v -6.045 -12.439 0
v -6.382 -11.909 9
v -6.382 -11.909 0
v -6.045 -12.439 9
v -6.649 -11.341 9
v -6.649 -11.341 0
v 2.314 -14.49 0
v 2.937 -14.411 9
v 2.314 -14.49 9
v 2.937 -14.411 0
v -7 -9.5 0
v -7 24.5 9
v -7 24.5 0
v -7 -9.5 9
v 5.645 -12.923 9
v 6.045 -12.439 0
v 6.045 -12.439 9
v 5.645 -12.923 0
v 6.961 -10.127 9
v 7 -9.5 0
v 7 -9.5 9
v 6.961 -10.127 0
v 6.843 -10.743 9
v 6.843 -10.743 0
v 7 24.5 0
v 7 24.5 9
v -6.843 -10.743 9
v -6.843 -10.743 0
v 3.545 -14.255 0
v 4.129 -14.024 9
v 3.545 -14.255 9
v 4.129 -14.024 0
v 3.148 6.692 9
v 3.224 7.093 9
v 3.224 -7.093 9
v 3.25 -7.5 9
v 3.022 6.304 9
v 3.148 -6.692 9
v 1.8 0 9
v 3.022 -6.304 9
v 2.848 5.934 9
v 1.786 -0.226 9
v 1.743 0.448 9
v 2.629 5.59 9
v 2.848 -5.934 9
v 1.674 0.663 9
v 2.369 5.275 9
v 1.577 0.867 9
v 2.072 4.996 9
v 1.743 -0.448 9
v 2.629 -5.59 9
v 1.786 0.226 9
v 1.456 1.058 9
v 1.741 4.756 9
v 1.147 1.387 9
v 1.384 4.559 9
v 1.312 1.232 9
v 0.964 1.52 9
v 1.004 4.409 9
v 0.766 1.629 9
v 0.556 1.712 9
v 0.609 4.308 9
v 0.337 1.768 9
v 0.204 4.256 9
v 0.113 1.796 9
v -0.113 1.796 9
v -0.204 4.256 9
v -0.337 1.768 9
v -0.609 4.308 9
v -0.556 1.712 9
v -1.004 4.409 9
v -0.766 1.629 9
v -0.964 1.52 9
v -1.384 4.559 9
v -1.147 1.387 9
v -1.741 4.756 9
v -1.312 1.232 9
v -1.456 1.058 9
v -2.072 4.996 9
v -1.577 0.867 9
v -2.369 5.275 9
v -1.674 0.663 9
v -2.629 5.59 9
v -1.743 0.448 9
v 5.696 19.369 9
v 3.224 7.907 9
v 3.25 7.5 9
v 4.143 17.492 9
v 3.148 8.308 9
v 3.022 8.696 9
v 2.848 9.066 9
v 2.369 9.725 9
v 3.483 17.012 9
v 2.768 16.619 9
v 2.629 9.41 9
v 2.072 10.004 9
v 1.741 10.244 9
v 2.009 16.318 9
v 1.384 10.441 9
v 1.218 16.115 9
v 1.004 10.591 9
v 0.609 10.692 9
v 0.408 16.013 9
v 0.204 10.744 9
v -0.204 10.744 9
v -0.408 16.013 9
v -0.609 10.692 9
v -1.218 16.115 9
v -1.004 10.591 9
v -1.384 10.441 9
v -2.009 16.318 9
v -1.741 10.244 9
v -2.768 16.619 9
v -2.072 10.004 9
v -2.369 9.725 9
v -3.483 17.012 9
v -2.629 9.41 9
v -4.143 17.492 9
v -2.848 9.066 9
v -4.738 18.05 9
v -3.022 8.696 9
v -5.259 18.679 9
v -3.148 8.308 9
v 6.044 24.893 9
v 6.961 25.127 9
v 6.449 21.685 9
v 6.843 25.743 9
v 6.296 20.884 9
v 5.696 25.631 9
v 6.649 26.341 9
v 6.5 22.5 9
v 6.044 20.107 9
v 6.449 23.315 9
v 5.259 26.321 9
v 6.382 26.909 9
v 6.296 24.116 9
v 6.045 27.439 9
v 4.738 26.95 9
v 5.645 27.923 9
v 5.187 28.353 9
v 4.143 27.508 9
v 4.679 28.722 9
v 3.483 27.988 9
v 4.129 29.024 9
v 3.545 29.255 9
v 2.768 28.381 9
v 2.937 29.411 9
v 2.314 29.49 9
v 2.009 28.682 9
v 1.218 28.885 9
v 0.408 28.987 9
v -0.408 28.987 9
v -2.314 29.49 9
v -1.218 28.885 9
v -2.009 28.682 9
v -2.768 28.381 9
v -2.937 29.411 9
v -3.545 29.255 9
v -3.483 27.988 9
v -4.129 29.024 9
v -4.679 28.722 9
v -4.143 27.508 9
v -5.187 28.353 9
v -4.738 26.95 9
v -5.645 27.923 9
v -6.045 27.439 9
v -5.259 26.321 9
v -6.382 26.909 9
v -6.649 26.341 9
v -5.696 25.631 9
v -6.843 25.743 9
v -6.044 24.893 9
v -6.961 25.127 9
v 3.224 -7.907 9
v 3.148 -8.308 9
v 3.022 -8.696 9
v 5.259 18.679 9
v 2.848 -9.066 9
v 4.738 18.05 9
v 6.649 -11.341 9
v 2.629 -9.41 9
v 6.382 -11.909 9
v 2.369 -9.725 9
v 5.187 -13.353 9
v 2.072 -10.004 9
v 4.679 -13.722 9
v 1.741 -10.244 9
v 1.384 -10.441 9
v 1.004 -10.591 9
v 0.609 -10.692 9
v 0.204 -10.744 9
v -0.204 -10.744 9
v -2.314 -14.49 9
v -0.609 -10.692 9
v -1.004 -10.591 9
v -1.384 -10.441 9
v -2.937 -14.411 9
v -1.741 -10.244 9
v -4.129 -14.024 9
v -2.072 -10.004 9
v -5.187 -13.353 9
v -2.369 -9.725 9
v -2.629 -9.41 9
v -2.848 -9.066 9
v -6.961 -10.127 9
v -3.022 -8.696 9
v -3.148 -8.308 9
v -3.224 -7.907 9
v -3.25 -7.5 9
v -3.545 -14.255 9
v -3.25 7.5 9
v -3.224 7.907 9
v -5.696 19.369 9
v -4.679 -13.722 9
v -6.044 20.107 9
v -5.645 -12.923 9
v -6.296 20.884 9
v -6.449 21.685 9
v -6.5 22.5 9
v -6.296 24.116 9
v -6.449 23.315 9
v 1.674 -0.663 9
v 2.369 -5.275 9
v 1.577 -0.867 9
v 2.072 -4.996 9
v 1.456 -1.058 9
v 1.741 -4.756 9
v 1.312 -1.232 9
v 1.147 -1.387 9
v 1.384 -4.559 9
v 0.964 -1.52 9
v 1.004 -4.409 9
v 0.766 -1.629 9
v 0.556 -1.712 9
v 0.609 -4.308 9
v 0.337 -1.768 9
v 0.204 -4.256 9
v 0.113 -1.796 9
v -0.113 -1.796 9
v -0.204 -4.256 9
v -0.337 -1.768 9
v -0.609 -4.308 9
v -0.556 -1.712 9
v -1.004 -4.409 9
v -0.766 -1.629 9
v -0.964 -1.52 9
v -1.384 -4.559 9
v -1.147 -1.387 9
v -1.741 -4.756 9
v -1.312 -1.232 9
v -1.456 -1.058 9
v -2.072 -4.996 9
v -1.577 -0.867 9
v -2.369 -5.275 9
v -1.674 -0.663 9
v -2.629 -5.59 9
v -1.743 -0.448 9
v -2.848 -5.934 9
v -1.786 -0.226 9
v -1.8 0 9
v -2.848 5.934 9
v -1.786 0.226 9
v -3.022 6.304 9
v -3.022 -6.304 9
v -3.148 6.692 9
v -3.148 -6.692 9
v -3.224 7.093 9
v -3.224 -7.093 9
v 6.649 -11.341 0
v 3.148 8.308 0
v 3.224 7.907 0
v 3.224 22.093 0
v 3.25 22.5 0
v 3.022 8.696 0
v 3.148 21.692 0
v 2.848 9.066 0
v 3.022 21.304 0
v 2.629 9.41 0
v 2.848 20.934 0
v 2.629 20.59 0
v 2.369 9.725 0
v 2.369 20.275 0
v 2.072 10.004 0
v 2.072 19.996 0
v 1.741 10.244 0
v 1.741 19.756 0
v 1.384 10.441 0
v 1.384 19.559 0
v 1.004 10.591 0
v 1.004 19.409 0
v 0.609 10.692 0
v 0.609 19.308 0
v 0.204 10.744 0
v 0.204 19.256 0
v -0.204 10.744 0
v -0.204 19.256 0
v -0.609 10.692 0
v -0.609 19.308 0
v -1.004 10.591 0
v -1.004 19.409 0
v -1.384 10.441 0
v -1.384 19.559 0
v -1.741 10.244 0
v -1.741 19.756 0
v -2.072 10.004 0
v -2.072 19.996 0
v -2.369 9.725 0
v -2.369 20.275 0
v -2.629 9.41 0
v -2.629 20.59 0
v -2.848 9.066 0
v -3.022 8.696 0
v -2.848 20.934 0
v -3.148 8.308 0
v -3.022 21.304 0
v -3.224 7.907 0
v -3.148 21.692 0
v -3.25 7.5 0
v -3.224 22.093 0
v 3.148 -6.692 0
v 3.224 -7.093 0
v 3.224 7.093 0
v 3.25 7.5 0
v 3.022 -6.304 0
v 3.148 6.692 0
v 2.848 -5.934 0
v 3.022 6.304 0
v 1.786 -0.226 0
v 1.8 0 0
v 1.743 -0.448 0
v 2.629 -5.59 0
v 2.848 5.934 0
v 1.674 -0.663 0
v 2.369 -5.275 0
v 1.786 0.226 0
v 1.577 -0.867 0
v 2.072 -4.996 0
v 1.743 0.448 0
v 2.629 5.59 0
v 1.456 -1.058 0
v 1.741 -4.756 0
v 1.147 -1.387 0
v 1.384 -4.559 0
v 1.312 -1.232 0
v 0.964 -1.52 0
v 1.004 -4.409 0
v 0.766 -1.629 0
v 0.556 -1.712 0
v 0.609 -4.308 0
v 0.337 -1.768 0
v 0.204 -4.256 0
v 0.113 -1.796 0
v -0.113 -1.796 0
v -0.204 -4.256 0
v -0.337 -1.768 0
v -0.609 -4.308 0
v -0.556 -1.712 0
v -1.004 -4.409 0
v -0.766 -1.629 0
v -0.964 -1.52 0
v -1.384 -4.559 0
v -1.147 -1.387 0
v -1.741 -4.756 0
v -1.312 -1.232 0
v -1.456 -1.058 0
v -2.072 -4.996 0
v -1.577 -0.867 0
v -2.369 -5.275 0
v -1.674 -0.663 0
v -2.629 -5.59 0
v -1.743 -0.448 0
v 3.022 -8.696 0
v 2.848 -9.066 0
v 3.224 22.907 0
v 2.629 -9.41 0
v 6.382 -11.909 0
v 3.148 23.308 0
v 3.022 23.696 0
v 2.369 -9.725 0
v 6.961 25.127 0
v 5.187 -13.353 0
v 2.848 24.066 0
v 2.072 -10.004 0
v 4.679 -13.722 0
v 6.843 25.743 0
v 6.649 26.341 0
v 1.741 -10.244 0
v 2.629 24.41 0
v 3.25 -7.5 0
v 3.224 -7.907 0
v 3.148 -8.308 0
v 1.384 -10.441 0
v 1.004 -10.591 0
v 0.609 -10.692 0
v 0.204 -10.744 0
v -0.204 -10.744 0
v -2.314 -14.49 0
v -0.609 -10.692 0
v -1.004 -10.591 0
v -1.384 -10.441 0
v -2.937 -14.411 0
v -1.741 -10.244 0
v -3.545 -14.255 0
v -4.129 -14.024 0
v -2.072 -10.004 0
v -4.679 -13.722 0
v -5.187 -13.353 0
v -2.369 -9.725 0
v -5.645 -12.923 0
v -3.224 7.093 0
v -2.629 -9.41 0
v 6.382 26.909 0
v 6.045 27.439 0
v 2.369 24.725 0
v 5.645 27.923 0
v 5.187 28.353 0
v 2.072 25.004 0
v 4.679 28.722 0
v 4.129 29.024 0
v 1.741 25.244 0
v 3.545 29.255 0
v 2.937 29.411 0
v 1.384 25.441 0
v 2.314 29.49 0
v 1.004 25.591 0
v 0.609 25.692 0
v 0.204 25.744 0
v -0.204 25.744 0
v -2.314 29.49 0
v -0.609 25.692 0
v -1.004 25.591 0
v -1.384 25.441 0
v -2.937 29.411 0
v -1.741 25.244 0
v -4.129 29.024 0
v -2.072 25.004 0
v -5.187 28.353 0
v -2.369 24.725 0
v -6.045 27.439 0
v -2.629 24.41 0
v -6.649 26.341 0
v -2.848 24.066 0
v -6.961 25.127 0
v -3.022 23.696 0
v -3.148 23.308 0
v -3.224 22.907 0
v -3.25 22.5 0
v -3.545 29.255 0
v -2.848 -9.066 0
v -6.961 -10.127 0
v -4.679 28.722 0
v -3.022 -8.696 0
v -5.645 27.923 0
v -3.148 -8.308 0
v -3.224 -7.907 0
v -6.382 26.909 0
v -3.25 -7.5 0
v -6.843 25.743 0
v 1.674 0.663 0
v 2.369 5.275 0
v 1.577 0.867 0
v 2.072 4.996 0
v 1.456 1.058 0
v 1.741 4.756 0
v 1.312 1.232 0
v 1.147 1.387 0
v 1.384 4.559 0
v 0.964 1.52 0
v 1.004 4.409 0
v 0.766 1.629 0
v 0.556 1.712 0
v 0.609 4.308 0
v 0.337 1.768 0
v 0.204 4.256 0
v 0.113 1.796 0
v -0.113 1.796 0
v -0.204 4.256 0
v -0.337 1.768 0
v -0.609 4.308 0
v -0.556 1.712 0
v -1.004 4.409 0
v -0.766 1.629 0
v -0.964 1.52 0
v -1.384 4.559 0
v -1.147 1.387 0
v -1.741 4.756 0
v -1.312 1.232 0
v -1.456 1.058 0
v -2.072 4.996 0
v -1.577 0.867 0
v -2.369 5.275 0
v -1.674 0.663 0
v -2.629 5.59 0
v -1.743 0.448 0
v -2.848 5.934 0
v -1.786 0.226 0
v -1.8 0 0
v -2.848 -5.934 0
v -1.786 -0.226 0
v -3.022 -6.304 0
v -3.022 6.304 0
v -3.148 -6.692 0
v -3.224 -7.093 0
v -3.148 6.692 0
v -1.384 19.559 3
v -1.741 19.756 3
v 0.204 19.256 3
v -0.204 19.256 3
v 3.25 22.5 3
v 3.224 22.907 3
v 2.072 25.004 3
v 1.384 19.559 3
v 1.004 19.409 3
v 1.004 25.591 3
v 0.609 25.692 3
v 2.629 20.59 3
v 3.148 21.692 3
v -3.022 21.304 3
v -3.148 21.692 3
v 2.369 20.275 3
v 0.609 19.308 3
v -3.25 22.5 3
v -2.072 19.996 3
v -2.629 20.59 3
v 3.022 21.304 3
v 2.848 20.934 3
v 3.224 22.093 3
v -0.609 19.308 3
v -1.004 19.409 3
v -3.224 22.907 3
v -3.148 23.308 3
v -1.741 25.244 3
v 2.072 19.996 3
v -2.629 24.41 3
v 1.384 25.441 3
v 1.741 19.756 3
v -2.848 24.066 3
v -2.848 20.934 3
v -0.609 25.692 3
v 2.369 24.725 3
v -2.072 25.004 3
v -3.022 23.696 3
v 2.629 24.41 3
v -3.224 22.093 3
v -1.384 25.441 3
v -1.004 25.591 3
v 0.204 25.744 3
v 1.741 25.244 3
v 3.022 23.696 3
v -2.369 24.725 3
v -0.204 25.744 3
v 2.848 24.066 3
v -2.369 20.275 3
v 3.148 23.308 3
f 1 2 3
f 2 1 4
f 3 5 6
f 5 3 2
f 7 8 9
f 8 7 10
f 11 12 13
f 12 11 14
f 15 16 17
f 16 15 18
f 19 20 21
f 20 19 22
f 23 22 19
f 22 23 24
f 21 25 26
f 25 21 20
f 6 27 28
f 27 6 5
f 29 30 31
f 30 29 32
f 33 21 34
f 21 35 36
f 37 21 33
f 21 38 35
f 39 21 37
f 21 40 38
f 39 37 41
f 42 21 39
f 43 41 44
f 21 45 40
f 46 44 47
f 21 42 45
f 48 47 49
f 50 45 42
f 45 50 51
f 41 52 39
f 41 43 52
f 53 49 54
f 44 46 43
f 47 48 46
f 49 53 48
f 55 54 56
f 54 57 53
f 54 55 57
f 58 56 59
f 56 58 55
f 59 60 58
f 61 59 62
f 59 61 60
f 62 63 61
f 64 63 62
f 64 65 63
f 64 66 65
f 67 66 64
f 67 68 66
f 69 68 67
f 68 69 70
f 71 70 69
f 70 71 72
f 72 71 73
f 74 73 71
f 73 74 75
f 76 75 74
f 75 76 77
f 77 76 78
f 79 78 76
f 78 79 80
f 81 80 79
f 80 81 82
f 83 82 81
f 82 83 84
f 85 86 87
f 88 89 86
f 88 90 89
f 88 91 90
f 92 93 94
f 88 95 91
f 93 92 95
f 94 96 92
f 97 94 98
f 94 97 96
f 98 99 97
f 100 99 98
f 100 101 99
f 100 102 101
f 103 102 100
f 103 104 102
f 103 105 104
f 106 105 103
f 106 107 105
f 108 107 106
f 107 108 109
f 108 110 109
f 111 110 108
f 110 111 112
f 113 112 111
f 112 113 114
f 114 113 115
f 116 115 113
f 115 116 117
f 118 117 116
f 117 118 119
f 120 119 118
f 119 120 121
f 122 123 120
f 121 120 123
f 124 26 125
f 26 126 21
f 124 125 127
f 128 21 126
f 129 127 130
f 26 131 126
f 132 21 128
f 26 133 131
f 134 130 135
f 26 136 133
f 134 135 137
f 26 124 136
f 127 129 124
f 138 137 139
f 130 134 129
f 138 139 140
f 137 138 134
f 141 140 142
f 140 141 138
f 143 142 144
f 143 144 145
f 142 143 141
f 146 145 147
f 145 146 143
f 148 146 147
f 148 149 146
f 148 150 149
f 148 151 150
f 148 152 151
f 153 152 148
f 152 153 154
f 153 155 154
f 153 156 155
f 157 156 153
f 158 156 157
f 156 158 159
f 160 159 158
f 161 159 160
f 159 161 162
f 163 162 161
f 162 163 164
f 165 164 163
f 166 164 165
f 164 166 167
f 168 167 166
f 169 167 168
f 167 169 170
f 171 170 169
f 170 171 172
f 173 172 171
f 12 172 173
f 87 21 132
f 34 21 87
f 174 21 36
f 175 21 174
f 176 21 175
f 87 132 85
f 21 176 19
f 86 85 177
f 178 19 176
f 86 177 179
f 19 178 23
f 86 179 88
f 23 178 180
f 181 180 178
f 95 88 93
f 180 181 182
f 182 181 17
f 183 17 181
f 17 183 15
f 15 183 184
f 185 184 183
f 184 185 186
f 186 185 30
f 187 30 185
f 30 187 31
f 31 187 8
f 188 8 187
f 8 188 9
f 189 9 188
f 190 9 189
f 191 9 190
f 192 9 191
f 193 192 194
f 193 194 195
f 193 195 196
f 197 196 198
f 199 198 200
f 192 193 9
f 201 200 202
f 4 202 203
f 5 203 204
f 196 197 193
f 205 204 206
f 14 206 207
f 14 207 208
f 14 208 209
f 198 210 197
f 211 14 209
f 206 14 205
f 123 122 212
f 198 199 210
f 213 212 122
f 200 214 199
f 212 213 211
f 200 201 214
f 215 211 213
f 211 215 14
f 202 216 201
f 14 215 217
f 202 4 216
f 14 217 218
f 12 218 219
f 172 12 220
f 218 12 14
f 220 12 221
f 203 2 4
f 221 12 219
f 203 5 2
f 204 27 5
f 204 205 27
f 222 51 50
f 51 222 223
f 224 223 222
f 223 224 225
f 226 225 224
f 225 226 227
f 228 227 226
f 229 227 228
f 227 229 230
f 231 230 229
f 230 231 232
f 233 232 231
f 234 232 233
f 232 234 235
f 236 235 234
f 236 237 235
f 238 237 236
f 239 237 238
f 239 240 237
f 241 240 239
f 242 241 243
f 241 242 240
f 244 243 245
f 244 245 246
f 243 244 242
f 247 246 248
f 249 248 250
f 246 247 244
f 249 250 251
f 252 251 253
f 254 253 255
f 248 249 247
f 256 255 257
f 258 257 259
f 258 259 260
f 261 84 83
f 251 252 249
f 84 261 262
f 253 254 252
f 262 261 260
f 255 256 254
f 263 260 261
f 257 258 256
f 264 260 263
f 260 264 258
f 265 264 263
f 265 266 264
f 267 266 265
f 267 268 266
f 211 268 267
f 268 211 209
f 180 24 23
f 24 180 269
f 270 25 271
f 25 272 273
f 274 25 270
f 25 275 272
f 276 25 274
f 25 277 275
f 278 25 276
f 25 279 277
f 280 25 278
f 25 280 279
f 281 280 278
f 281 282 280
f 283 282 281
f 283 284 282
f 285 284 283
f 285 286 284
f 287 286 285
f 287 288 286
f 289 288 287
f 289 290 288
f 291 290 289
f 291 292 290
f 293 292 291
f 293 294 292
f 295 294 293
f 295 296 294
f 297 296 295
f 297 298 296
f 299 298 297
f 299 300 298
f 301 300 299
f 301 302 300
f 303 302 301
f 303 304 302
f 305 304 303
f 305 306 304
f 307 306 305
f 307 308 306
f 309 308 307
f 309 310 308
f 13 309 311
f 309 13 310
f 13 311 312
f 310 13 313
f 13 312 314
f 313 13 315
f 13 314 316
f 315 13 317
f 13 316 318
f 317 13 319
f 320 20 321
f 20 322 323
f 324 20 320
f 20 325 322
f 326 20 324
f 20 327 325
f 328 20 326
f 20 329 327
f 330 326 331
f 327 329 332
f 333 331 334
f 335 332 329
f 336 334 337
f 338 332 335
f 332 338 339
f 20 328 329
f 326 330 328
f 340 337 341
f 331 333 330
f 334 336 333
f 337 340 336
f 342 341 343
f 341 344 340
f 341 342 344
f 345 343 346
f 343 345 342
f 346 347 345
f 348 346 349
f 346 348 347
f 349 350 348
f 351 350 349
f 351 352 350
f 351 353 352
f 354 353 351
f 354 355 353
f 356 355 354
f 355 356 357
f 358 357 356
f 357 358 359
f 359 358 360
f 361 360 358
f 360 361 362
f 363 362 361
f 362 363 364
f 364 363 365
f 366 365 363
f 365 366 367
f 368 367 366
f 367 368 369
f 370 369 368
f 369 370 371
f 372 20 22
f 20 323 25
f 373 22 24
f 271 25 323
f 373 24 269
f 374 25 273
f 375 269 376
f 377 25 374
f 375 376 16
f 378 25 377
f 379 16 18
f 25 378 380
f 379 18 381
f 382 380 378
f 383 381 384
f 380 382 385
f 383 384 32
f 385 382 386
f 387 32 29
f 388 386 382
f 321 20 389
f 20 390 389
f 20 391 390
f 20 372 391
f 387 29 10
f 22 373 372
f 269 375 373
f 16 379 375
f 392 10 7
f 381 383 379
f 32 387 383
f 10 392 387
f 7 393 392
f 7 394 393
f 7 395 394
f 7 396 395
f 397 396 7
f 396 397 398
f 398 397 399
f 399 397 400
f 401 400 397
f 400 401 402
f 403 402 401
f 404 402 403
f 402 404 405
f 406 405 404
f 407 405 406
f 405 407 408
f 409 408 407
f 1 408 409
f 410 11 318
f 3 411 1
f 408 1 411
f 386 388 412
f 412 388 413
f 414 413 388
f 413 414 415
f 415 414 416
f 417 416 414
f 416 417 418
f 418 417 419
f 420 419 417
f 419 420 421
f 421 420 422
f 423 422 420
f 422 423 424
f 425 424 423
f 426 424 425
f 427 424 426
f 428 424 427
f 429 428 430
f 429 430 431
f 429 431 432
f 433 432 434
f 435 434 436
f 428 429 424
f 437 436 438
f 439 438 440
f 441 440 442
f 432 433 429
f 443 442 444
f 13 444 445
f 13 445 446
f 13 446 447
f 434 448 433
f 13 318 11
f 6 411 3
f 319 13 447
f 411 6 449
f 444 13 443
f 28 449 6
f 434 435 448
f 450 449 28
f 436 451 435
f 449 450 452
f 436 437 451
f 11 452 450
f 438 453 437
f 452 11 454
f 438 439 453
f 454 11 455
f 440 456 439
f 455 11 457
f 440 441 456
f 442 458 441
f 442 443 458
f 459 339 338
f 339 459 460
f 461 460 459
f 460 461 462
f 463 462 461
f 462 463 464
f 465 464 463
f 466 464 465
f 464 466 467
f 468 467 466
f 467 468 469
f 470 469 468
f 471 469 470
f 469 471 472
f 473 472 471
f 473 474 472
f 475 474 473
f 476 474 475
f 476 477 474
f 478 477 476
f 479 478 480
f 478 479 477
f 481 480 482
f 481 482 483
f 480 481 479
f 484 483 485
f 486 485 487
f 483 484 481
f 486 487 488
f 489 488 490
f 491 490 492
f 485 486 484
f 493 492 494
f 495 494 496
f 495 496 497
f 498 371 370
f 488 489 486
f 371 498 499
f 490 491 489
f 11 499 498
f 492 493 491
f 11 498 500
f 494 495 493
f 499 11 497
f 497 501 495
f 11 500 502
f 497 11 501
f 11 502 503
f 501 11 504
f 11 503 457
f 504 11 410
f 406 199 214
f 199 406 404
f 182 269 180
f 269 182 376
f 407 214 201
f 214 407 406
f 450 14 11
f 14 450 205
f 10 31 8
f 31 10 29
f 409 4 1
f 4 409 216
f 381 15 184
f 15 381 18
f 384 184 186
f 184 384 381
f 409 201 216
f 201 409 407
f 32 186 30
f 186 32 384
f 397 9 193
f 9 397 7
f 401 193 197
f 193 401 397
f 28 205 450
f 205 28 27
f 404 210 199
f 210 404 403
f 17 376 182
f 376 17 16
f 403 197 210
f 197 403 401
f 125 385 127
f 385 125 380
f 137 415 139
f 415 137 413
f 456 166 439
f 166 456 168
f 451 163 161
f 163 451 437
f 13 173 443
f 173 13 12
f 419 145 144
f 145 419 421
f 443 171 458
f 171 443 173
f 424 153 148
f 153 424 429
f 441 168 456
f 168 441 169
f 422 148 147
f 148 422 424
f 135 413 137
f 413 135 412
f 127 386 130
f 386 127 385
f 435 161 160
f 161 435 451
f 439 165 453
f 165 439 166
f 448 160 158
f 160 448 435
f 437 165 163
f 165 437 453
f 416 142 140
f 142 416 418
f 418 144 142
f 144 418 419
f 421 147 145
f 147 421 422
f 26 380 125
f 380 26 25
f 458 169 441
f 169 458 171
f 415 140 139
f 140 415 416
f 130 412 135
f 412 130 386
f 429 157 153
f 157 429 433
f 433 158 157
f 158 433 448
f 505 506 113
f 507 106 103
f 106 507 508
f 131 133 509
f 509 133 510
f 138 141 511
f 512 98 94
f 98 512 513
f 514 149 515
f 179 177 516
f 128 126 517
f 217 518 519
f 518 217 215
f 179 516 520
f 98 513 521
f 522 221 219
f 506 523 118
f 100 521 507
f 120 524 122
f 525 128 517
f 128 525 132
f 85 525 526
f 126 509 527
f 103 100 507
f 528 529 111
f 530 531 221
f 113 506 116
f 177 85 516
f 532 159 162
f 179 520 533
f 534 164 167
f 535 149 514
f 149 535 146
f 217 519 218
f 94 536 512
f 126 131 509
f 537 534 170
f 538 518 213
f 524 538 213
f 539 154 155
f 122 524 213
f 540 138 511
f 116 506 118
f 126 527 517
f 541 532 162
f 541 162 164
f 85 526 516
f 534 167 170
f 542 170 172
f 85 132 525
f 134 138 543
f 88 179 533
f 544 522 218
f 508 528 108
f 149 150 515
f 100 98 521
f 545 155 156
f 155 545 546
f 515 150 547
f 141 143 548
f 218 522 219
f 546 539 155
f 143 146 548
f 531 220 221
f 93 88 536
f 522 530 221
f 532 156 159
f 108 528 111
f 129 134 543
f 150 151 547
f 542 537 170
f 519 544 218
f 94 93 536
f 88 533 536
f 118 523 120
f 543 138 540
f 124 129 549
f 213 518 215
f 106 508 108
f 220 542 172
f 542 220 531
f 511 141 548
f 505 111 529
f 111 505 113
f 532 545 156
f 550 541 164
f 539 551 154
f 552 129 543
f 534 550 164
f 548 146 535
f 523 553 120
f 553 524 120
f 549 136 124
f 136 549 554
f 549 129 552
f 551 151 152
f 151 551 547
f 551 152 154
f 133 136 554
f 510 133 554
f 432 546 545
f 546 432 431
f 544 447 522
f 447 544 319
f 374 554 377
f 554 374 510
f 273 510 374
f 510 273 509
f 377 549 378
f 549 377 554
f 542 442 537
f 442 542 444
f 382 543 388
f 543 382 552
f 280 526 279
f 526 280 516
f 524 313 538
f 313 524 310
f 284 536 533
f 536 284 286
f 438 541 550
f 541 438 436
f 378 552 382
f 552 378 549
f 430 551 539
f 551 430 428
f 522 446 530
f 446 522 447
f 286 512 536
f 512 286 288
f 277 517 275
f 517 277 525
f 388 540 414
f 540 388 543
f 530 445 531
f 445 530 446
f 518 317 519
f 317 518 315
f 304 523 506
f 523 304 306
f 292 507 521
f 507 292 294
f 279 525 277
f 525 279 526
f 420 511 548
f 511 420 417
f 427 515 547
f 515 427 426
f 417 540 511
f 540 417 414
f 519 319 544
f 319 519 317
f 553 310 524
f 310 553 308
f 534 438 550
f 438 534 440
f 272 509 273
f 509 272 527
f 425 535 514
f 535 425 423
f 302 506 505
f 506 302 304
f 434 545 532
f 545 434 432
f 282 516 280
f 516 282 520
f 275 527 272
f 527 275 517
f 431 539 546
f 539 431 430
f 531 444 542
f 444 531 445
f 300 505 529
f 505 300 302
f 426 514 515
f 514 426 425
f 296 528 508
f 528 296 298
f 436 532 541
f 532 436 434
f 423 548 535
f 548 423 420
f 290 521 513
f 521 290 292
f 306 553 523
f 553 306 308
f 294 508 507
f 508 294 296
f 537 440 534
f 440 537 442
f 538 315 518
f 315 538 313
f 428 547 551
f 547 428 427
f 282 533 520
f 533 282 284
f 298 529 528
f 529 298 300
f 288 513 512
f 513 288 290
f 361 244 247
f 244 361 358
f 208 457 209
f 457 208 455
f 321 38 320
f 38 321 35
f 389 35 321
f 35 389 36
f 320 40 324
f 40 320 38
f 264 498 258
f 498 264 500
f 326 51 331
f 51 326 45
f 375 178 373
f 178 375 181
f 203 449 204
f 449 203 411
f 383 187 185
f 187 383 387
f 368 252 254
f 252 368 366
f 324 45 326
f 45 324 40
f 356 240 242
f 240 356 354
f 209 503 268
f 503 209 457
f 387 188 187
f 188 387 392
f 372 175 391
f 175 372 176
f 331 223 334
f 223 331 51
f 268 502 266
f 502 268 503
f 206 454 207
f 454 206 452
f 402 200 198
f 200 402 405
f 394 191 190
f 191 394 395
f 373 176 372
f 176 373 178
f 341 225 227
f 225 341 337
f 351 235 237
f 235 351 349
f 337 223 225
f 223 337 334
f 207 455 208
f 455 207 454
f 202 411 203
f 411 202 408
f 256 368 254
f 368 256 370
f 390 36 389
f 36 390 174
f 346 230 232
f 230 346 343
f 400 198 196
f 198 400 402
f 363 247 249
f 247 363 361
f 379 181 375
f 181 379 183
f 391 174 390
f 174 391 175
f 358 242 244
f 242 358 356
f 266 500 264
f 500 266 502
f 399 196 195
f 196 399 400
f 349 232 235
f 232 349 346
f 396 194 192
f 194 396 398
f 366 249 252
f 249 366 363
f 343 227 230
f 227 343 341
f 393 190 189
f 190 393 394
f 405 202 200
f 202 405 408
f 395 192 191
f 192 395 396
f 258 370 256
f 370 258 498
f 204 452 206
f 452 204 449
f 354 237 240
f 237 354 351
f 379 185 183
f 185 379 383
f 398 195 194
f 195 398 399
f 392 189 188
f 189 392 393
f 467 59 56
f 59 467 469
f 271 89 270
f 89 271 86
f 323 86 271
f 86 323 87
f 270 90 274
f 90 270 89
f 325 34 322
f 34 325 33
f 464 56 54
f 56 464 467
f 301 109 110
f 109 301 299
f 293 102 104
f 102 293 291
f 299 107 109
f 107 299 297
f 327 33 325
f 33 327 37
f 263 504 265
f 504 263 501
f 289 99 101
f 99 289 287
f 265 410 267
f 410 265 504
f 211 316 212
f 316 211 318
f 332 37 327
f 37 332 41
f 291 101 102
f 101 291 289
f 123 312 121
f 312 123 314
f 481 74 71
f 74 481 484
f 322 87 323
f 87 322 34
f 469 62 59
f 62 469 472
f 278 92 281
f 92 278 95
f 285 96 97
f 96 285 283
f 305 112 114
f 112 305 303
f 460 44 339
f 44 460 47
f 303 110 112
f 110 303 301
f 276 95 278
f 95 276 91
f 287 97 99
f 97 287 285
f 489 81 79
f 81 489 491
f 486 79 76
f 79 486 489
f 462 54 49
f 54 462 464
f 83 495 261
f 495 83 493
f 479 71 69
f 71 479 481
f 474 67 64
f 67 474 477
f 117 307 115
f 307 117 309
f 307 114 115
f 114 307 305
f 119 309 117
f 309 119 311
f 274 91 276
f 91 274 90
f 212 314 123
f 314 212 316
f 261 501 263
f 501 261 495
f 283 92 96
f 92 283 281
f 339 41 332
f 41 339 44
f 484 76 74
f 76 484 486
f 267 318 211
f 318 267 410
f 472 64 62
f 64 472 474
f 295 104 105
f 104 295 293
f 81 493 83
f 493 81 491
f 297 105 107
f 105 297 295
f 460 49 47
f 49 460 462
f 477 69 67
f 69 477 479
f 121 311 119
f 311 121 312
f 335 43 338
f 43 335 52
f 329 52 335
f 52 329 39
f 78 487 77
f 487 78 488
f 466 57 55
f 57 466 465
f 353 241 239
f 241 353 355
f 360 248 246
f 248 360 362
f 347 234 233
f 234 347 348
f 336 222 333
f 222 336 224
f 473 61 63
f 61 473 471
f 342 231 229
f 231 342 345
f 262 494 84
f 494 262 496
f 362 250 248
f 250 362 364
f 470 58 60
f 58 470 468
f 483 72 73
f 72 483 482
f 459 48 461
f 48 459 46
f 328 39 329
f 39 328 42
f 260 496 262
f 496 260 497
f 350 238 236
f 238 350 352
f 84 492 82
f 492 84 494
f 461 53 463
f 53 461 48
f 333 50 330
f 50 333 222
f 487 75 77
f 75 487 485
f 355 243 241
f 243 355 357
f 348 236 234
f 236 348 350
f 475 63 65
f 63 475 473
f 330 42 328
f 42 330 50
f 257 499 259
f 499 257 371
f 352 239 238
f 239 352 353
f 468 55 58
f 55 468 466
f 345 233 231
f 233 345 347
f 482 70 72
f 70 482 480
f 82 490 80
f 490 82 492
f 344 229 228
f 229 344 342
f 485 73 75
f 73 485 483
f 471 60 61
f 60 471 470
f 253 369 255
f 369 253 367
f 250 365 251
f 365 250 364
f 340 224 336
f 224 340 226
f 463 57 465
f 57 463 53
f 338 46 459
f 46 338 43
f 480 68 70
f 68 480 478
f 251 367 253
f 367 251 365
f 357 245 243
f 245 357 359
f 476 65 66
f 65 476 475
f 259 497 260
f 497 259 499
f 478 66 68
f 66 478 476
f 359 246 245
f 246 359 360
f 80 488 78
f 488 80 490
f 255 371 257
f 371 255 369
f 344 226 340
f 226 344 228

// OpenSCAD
$fn = 50;


difference() {
	union() {
		hull() {
			translate(v = [-2.0000000000, 9.5000000000, 0]) {
				cylinder(h = 9, r = 5);
			}
			translate(v = [2.0000000000, 9.5000000000, 0]) {
				cylinder(h = 9, r = 5);
			}
			translate(v = [-2.0000000000, -9.5000000000, 0]) {
				cylinder(h = 9, r = 5);
			}
			translate(v = [2.0000000000, -9.5000000000, 0]) {
				cylinder(h = 9, r = 5);
			}
		}
		translate(v = [0.0000000000, 15.0000000000, 0]) {
			hull() {
				translate(v = [-2.0000000000, 9.5000000000, 0]) {
					cylinder(h = 9, r = 5);
				}
				translate(v = [2.0000000000, 9.5000000000, 0]) {
					cylinder(h = 9, r = 5);
				}
				translate(v = [-2.0000000000, -9.5000000000, 0]) {
					cylinder(h = 9, r = 5);
				}
				translate(v = [2.0000000000, -9.5000000000, 0]) {
					cylinder(h = 9, r = 5);
				}
			}
		}
		translate(v = [0.0000000000, 15.0000000000, 0]) {
			hull() {
				translate(v = [-2.0000000000, 9.5000000000, 0]) {
					cylinder(h = 9, r = 5);
				}
				translate(v = [2.0000000000, 9.5000000000, 0]) {
					cylinder(h = 9, r = 5);
				}
				translate(v = [-2.0000000000, -9.5000000000, 0]) {
					cylinder(h = 9, r = 5);
				}
				translate(v = [2.0000000000, -9.5000000000, 0]) {
					cylinder(h = 9, r = 5);
				}
			}
		}
	}
	union() {
		translate(v = [0.0000000000, 22.5000000000, 9]) {
			rotate(a = [0, 0, 0]) {
				difference() {
					union() {
						#translate(v = [0, 0, -9.0000000000]) {
							cylinder(h = 9, r = 2.2500000000);
						}
						#translate(v = [0, 0, -6]) {
							cylinder(h = 6, r1 = 3.2500000000, r2 = 6.5000000000);
						}
						#translate(v = [0, 0, -9.0000000000]) {
							cylinder(h = 9, r = 3.2500000000);
						}
						#translate(v = [0, 0, -9.0000000000]) {
							cylinder(h = 9, r = 2.2500000000);
						}
					}
					union();
				}
			}
		}
		translate(v = [0.0000000000, 22.5000000000, 9]) {
			rotate(a = [0, 0, 0]) {
				difference() {
					union() {
						#translate(v = [0, 0, -9.0000000000]) {
							cylinder(h = 9, r = 2.2500000000);
						}
						#translate(v = [0, 0, -6]) {
							cylinder(h = 6, r1 = 3.2500000000, r2 = 6.5000000000);
						}
						#translate(v = [0, 0, -9.0000000000]) {
							cylinder(h = 9, r = 3.2500000000);
						}
						#translate(v = [0, 0, -9.0000000000]) {
							cylinder(h = 9, r = 2.2500000000);
						}
					}
					union();
				}
			}
		}
		translate(v = [0.0000000000, -7.5000000000, 0]) {
			translate(v = [0, 0, -100]) {
				cylinder(h = 200, r = 3.2500000000);
			}
		}
		translate(v = [0.0000000000, 7.5000000000, 0]) {
			translate(v = [0, 0, -100]) {
				cylinder(h = 200, r = 3.2500000000);
			}
		}
		translate(v = [0.0000000000, -7.5000000000, 0]) {
			translate(v = [0, 0, -100]) {
				cylinder(h = 200, r = 1.8000000000);
			}
		}
		translate(v = [0, 0, -100]) {
			cylinder(h = 200, r = 1.8000000000);
		}
		translate(v = [0.0000000000, 7.5000000000, 0]) {
			translate(v = [0, 0, -100]) {
				cylinder(h = 200, r = 1.8000000000);
			}
		}
	}
}
